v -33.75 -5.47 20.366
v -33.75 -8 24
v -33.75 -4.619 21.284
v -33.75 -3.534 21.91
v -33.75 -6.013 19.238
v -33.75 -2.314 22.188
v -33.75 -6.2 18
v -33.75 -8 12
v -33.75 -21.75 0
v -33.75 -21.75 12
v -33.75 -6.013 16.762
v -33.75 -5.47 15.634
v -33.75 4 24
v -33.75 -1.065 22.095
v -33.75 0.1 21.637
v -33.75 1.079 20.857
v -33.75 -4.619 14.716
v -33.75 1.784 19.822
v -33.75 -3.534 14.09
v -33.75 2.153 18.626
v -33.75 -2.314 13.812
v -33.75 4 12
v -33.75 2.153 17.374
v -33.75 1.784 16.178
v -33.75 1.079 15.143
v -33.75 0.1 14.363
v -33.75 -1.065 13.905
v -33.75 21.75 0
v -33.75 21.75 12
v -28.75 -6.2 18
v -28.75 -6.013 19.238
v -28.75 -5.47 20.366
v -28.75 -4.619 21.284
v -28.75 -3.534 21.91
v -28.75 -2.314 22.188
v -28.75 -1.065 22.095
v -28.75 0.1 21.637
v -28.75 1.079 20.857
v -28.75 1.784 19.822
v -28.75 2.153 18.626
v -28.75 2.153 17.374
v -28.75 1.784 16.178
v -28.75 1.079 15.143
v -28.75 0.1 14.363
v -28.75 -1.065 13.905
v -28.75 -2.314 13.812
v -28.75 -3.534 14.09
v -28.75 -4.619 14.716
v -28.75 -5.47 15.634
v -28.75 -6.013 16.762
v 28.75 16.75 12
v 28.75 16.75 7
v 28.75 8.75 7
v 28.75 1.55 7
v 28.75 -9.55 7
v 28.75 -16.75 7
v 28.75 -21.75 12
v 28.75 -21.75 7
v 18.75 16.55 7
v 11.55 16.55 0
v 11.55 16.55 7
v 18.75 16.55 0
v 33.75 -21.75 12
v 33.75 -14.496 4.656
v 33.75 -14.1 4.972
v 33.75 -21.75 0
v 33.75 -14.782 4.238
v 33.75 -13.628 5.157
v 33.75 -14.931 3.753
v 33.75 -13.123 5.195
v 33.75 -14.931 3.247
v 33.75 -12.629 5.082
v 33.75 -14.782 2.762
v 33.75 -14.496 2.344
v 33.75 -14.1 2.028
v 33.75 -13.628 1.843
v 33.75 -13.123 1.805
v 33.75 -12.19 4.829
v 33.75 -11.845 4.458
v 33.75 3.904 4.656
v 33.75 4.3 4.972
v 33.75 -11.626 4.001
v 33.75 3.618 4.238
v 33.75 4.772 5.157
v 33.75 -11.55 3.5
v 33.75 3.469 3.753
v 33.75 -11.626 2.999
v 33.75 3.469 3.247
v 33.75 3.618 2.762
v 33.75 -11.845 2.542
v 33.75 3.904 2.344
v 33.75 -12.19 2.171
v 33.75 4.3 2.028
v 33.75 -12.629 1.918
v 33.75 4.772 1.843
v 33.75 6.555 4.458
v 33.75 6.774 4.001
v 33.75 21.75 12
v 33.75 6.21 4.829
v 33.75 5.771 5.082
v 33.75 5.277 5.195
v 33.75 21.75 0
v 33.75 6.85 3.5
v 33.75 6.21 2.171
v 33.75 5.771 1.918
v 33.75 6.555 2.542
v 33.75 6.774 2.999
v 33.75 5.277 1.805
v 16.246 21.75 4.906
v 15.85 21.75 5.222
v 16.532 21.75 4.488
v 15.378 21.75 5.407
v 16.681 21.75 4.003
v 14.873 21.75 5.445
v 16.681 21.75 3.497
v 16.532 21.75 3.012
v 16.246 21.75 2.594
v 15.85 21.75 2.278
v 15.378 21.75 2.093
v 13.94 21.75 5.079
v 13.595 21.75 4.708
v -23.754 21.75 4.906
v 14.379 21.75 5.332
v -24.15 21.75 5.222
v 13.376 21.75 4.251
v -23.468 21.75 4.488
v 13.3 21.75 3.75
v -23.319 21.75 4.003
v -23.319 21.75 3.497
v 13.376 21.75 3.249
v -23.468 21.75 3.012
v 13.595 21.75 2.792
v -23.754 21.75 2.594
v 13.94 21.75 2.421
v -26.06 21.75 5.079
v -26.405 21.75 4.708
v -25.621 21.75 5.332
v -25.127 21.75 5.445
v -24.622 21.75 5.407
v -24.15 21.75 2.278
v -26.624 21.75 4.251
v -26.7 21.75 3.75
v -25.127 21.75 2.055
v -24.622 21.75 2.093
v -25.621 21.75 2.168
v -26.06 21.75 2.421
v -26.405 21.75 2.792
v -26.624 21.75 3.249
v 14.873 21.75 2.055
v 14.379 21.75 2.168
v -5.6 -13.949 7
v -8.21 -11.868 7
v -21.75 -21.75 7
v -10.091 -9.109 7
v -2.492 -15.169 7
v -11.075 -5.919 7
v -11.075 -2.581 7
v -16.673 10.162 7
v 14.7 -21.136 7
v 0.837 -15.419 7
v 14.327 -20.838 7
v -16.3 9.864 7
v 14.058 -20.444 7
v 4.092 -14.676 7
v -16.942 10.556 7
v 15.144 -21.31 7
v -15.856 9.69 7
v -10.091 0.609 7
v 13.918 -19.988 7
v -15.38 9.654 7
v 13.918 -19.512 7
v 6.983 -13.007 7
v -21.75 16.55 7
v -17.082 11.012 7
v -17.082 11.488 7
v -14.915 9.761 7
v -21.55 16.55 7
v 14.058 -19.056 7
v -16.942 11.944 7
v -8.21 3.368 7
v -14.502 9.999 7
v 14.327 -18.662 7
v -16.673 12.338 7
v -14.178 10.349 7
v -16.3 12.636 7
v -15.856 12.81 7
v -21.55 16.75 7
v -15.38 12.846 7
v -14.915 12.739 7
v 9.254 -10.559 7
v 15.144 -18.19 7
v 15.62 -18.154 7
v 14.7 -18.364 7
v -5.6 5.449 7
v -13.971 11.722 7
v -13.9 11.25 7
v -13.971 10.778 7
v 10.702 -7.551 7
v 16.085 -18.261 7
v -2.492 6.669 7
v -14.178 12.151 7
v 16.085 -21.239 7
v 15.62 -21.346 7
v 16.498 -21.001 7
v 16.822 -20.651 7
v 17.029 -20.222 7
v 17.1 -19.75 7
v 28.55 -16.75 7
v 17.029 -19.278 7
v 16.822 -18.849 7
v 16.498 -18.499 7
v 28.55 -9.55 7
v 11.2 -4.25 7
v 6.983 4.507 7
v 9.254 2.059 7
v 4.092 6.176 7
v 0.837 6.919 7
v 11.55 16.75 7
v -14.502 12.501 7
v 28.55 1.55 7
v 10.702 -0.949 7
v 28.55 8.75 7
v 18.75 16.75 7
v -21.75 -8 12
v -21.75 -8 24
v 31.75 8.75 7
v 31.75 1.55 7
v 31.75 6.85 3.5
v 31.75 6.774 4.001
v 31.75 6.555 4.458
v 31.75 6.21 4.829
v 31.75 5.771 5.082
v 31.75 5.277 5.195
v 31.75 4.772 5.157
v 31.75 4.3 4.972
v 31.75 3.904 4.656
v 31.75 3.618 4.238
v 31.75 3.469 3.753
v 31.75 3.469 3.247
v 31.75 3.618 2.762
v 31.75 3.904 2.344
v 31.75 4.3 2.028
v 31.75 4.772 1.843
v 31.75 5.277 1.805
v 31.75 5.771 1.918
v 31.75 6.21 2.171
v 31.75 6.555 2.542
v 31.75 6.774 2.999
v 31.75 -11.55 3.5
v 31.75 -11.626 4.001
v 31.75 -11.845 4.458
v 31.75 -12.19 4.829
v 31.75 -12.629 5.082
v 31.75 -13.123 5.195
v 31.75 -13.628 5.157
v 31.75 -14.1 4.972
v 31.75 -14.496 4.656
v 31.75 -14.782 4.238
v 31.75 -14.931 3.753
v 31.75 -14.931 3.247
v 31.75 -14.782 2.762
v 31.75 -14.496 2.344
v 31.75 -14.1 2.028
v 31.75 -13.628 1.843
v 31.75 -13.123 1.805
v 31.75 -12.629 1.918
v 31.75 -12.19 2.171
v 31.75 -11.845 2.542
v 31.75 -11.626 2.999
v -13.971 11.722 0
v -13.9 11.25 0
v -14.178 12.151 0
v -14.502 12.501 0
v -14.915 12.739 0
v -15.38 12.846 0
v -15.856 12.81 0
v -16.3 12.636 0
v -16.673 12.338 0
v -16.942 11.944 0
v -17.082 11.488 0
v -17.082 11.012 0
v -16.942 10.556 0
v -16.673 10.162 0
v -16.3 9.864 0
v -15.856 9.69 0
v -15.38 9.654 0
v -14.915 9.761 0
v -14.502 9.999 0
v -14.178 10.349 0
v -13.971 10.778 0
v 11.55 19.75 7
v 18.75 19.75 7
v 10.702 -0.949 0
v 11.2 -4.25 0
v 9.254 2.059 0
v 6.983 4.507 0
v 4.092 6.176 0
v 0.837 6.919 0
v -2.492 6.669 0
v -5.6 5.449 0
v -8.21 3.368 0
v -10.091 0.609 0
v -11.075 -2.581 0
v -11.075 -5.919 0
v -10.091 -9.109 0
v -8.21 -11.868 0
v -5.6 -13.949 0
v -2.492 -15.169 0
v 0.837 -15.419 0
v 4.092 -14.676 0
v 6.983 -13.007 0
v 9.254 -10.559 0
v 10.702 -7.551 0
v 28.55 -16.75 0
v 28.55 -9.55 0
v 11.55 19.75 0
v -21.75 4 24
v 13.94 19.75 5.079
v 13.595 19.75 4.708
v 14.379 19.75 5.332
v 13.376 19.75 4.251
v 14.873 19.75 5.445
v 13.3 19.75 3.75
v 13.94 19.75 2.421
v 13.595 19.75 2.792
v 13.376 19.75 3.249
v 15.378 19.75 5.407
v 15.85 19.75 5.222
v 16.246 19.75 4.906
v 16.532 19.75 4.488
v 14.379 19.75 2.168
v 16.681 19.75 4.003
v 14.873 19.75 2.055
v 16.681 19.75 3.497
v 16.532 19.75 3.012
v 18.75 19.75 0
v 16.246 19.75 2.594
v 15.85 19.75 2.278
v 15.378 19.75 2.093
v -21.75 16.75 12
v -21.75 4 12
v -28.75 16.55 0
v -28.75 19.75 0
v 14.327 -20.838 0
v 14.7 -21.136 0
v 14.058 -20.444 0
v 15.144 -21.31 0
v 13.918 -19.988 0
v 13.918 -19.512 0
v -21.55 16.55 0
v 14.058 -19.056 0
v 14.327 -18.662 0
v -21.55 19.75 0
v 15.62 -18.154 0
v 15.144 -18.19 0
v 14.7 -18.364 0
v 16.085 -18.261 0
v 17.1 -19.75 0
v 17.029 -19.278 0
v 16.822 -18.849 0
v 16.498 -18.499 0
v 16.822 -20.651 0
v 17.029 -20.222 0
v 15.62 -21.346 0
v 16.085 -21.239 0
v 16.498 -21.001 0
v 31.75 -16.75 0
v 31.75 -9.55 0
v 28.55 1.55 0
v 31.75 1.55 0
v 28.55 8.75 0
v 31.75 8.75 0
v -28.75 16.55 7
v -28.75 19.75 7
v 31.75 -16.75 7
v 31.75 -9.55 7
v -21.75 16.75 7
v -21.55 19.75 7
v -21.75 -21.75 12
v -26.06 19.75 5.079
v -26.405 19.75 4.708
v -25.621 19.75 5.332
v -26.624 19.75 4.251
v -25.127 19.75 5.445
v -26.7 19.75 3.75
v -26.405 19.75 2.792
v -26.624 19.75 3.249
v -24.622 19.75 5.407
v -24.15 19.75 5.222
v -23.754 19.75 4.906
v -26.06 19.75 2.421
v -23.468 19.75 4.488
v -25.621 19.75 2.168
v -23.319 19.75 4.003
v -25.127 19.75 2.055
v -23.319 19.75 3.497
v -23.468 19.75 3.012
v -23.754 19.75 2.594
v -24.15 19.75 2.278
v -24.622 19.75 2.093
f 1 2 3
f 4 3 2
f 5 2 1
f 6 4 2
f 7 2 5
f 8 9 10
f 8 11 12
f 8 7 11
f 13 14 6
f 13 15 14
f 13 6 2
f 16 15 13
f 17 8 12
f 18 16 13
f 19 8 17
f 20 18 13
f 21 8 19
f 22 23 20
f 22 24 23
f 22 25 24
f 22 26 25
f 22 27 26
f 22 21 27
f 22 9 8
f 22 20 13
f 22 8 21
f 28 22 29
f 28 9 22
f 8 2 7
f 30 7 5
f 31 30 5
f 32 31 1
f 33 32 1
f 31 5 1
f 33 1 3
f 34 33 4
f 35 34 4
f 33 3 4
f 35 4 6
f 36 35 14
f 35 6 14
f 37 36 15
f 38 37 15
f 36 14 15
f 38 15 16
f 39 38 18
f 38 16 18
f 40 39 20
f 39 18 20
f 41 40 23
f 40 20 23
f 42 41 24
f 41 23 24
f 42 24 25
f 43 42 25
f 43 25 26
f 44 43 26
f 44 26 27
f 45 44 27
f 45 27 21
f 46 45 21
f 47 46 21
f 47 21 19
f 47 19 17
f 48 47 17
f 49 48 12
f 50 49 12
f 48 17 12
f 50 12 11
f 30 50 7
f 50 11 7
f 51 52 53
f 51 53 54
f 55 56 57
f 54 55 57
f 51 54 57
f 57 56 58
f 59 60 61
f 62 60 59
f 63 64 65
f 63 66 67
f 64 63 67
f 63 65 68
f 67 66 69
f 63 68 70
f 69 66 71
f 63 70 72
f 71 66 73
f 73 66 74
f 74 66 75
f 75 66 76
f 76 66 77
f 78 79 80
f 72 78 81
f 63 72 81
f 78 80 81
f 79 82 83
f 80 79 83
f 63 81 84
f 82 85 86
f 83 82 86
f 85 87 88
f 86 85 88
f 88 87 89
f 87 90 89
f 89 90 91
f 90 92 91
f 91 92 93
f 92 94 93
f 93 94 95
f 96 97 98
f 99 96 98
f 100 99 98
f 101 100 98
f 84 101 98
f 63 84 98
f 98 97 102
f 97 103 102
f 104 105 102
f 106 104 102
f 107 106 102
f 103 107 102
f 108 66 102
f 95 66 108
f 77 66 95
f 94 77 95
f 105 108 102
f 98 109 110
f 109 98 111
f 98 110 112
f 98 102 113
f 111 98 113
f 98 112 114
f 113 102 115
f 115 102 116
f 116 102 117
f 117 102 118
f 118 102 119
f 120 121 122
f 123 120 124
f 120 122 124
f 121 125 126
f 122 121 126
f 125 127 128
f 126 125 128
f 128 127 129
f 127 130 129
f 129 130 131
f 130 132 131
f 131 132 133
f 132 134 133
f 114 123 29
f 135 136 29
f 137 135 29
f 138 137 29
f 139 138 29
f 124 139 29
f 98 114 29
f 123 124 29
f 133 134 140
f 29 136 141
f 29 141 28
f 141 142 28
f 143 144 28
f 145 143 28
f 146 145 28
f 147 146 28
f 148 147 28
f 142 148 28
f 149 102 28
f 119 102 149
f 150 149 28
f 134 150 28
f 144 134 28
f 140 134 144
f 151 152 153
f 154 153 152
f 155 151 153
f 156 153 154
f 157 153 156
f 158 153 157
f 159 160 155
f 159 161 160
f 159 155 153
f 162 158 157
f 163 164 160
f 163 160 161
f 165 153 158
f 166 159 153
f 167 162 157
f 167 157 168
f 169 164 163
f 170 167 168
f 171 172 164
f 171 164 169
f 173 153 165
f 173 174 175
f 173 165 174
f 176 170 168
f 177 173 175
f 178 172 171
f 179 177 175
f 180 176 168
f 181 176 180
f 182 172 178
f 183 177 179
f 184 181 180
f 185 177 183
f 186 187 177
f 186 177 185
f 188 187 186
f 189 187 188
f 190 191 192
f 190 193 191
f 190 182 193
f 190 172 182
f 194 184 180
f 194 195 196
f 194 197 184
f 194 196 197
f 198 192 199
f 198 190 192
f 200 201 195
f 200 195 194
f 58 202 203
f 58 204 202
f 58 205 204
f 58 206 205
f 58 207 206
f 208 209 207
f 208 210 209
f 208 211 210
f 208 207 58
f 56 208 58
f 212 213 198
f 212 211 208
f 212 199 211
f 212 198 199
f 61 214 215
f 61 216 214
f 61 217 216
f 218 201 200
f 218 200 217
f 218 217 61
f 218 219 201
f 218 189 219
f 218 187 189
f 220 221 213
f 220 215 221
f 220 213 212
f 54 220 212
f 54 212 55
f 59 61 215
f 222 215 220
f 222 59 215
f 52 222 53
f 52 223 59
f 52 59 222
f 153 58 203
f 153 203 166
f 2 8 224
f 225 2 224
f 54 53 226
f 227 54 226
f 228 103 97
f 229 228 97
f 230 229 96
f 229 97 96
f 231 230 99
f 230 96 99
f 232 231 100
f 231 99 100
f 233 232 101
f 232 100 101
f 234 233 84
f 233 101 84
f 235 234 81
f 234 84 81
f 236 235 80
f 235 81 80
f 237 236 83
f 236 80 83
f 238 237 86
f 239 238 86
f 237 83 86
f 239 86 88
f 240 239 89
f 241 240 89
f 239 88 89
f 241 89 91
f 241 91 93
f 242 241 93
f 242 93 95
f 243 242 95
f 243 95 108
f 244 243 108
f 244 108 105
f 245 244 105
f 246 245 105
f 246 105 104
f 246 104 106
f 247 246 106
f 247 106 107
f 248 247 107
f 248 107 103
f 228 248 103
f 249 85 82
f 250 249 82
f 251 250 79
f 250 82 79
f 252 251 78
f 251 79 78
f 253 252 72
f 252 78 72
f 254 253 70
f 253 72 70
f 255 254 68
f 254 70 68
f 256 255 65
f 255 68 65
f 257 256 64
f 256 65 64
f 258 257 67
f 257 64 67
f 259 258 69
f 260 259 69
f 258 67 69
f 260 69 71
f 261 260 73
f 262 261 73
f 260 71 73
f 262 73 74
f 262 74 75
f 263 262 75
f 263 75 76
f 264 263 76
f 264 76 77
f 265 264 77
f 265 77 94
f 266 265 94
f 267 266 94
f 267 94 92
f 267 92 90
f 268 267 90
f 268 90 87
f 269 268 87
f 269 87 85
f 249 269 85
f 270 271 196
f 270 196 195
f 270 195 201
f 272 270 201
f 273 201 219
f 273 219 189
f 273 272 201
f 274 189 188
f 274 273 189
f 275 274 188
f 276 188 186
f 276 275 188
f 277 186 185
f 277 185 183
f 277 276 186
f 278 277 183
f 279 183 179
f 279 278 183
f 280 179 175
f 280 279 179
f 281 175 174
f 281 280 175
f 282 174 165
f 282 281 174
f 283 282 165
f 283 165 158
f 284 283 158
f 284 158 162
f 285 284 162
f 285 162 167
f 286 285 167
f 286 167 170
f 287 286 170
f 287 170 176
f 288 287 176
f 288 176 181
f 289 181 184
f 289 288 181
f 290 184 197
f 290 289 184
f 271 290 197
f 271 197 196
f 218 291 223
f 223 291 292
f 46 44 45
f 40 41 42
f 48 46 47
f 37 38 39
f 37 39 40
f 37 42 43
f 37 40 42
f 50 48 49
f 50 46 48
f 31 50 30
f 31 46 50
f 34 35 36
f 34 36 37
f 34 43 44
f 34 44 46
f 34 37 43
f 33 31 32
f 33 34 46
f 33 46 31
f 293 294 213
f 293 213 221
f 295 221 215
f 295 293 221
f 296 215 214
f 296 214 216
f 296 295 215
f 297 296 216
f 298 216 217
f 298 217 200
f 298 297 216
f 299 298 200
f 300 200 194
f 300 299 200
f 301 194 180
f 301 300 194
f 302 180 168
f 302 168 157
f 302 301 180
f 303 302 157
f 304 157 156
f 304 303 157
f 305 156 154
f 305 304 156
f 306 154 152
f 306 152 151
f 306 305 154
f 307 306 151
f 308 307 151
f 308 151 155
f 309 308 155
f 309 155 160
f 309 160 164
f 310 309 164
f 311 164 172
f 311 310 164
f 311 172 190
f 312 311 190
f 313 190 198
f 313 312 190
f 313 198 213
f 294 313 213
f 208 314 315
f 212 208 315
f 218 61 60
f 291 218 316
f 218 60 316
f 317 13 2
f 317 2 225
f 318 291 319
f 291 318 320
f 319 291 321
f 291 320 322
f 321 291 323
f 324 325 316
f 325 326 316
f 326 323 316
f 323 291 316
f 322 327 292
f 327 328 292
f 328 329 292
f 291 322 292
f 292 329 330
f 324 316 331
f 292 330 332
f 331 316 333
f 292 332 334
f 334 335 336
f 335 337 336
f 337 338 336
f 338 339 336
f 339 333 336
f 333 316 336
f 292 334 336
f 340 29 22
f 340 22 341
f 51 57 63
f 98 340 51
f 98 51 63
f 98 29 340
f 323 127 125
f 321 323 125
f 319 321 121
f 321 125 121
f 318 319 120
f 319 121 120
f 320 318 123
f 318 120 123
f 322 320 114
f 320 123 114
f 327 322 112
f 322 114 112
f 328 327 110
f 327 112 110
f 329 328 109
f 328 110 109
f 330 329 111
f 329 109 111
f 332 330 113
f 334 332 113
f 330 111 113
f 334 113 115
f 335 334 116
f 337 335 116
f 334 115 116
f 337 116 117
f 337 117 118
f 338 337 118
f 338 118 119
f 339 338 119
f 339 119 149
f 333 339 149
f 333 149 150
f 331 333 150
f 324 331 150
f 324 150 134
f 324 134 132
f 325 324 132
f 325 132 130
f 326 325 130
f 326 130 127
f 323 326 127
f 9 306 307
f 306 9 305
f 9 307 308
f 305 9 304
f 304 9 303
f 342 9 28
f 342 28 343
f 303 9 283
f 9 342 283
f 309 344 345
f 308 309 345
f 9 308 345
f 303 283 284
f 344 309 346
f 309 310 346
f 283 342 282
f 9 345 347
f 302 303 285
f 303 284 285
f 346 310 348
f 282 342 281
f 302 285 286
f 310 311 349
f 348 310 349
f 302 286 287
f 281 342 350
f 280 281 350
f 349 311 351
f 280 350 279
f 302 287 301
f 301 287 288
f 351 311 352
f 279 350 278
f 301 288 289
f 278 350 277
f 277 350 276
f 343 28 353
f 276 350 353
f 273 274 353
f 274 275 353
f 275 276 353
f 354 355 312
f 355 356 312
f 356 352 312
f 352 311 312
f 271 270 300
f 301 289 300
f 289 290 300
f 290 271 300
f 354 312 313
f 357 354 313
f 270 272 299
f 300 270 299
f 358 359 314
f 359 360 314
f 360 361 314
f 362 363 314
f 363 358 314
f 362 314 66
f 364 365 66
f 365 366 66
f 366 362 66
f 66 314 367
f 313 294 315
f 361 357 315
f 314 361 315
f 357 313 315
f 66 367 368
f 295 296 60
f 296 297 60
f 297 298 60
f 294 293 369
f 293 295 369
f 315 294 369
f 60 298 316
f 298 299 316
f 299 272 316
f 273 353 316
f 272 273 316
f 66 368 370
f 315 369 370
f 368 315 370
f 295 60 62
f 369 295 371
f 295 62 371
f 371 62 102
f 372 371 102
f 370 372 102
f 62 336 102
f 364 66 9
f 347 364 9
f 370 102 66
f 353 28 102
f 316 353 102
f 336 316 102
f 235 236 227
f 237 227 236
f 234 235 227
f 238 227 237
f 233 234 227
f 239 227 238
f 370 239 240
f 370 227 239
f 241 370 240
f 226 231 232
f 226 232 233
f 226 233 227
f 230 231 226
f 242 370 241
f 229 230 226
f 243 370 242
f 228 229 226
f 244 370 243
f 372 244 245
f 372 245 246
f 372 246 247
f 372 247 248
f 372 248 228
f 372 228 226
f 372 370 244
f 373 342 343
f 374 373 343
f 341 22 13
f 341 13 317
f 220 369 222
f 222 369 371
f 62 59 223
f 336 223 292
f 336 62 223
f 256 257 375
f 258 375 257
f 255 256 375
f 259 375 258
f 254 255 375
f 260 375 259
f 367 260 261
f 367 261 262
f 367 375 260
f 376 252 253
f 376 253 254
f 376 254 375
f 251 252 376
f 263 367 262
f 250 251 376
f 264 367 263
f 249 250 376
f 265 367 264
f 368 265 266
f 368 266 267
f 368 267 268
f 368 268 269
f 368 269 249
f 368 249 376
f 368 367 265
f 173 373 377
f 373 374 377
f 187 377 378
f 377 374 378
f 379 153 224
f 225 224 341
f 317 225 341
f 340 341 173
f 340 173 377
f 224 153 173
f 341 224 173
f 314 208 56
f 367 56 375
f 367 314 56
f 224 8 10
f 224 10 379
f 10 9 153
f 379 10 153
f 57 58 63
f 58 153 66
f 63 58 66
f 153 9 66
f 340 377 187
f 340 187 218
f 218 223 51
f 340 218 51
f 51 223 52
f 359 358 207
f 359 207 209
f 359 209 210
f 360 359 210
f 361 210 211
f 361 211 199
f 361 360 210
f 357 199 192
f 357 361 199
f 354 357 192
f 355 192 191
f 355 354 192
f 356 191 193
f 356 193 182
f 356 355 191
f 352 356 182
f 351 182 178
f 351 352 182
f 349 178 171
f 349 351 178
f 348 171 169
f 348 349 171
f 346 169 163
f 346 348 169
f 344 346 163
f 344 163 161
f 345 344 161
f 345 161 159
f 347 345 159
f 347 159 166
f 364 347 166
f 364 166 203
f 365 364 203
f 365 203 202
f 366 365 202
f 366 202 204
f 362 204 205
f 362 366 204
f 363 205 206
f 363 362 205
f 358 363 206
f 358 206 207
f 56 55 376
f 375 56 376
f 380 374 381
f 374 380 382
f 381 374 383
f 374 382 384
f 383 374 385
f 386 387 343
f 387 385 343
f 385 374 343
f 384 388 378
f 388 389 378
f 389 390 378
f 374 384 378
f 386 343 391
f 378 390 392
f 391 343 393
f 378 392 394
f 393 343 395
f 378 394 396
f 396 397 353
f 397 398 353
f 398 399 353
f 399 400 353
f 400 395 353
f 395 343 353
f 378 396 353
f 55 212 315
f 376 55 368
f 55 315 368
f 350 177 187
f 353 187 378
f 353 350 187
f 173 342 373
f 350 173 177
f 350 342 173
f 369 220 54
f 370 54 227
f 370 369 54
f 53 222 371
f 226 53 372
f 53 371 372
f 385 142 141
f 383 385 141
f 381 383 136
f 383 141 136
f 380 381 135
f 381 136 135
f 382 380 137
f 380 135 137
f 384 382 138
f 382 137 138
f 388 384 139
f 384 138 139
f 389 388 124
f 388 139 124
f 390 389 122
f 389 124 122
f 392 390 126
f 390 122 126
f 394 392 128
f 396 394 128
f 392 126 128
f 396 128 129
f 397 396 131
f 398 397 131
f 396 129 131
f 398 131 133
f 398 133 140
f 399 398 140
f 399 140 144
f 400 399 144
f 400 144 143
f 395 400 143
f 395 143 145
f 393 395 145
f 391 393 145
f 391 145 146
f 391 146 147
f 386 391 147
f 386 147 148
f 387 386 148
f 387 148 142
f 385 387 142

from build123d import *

# Parameters (mm, degrees)
SKETCH_W        = 67.5
SKETCH_H        = 43.5
SKETCH_R        = 11.2
SKETCH_R_2      = 1.6
SKETCH_W_2      = 7.2
SKETCH_H_2      = 3.2
SKETCH_W_3      = 3.2
SKETCH_H_3      = 7.2
PAD_DEPTH       = 7
PAD001_DEPTH    = 5
SKETCH002_W     = 12
SKETCH002_H     = 12
PAD002_DEPTH    = 12
SKETCH003_R     = 4.2
POCKET_DEPTH    = 5
SKETCH004_R     = 1.7
POCKET001_DEPTH = 5
SKETCH005_R     = 1.7
POCKET002_DEPTH = 5


with BuildPart() as part:
    # Sketch → Pad (new body)
    with BuildSketch(Plane.XY):
        Rectangle(SKETCH_W, SKETCH_H)
        with Locations((0, -4.25)):
            Circle(SKETCH_R, mode=Mode.SUBTRACT)
        with Locations((-15.5, 11.25)):
            Circle(SKETCH_R_2, mode=Mode.SUBTRACT)
        with Locations((15.5, -19.75)):
            Circle(SKETCH_R_2, mode=Mode.SUBTRACT)
        with Locations((15.15, 18.15)):
            Rectangle(SKETCH_W_2, SKETCH_H_2, mode=Mode.SUBTRACT)
        with Locations((-25.15, 18.15)):
            Rectangle(SKETCH_W_2, SKETCH_H_2, mode=Mode.SUBTRACT)
        with Locations((30.15, 5.15)):
            Rectangle(SKETCH_W_3, SKETCH_H_3, mode=Mode.SUBTRACT)
        with Locations((30.15, -13.15)):
            Rectangle(SKETCH_W_3, SKETCH_H_3, mode=Mode.SUBTRACT)
    extrude(amount=PAD_DEPTH)

    # Sketch001 → Pad001 (new body)
    with BuildSketch(Plane.XY.offset(7)):
        Polygon((28.75, -21.75), (33.75, -21.75), (33.75, 21.75), (-33.75, 21.75), (-33.75, -21.75), (-21.75, -21.75), (-21.75, 16.75), (28.75, 16.75), align=None)
    extrude(amount=PAD001_DEPTH)

    # Sketch002 → Pad002 (new body)
    with BuildSketch(Plane.XY.offset(12)):
        with Locations((-27.75, -2)):
            Rectangle(SKETCH002_W, SKETCH002_H)
    extrude(amount=PAD002_DEPTH)

    # Sketch003 → Pocket (cut)
    with BuildSketch(Plane(origin=(-33.75, 0, 0), x_dir=(0, -1, 0), z_dir=(-1, 0, 0))):
        with Locations((2, 18)):
            Circle(SKETCH003_R)
    extrude(amount=-POCKET_DEPTH, mode=Mode.SUBTRACT)

    # Sketch004 → Pocket001 (cut)
    with BuildSketch(Plane(origin=(0, 21.75, 0), x_dir=(-1, 0, 0), z_dir=(0, 1, 0))):
        with Locations((25, 3.75)):
            Circle(SKETCH004_R)
        with Locations((-15, 3.75)):
            Circle(SKETCH004_R)
    extrude(amount=-POCKET001_DEPTH, mode=Mode.SUBTRACT)

    # Sketch005 → Pocket002 (cut)
    with BuildSketch(Plane.YZ.offset(33.75)):
        with Locations((5.15, 3.5)):
            Circle(SKETCH005_R)
        with Locations((-13.25, 3.5)):
            Circle(SKETCH005_R)
    extrude(amount=-POCKET002_DEPTH, mode=Mode.SUBTRACT)


solid = part.part
